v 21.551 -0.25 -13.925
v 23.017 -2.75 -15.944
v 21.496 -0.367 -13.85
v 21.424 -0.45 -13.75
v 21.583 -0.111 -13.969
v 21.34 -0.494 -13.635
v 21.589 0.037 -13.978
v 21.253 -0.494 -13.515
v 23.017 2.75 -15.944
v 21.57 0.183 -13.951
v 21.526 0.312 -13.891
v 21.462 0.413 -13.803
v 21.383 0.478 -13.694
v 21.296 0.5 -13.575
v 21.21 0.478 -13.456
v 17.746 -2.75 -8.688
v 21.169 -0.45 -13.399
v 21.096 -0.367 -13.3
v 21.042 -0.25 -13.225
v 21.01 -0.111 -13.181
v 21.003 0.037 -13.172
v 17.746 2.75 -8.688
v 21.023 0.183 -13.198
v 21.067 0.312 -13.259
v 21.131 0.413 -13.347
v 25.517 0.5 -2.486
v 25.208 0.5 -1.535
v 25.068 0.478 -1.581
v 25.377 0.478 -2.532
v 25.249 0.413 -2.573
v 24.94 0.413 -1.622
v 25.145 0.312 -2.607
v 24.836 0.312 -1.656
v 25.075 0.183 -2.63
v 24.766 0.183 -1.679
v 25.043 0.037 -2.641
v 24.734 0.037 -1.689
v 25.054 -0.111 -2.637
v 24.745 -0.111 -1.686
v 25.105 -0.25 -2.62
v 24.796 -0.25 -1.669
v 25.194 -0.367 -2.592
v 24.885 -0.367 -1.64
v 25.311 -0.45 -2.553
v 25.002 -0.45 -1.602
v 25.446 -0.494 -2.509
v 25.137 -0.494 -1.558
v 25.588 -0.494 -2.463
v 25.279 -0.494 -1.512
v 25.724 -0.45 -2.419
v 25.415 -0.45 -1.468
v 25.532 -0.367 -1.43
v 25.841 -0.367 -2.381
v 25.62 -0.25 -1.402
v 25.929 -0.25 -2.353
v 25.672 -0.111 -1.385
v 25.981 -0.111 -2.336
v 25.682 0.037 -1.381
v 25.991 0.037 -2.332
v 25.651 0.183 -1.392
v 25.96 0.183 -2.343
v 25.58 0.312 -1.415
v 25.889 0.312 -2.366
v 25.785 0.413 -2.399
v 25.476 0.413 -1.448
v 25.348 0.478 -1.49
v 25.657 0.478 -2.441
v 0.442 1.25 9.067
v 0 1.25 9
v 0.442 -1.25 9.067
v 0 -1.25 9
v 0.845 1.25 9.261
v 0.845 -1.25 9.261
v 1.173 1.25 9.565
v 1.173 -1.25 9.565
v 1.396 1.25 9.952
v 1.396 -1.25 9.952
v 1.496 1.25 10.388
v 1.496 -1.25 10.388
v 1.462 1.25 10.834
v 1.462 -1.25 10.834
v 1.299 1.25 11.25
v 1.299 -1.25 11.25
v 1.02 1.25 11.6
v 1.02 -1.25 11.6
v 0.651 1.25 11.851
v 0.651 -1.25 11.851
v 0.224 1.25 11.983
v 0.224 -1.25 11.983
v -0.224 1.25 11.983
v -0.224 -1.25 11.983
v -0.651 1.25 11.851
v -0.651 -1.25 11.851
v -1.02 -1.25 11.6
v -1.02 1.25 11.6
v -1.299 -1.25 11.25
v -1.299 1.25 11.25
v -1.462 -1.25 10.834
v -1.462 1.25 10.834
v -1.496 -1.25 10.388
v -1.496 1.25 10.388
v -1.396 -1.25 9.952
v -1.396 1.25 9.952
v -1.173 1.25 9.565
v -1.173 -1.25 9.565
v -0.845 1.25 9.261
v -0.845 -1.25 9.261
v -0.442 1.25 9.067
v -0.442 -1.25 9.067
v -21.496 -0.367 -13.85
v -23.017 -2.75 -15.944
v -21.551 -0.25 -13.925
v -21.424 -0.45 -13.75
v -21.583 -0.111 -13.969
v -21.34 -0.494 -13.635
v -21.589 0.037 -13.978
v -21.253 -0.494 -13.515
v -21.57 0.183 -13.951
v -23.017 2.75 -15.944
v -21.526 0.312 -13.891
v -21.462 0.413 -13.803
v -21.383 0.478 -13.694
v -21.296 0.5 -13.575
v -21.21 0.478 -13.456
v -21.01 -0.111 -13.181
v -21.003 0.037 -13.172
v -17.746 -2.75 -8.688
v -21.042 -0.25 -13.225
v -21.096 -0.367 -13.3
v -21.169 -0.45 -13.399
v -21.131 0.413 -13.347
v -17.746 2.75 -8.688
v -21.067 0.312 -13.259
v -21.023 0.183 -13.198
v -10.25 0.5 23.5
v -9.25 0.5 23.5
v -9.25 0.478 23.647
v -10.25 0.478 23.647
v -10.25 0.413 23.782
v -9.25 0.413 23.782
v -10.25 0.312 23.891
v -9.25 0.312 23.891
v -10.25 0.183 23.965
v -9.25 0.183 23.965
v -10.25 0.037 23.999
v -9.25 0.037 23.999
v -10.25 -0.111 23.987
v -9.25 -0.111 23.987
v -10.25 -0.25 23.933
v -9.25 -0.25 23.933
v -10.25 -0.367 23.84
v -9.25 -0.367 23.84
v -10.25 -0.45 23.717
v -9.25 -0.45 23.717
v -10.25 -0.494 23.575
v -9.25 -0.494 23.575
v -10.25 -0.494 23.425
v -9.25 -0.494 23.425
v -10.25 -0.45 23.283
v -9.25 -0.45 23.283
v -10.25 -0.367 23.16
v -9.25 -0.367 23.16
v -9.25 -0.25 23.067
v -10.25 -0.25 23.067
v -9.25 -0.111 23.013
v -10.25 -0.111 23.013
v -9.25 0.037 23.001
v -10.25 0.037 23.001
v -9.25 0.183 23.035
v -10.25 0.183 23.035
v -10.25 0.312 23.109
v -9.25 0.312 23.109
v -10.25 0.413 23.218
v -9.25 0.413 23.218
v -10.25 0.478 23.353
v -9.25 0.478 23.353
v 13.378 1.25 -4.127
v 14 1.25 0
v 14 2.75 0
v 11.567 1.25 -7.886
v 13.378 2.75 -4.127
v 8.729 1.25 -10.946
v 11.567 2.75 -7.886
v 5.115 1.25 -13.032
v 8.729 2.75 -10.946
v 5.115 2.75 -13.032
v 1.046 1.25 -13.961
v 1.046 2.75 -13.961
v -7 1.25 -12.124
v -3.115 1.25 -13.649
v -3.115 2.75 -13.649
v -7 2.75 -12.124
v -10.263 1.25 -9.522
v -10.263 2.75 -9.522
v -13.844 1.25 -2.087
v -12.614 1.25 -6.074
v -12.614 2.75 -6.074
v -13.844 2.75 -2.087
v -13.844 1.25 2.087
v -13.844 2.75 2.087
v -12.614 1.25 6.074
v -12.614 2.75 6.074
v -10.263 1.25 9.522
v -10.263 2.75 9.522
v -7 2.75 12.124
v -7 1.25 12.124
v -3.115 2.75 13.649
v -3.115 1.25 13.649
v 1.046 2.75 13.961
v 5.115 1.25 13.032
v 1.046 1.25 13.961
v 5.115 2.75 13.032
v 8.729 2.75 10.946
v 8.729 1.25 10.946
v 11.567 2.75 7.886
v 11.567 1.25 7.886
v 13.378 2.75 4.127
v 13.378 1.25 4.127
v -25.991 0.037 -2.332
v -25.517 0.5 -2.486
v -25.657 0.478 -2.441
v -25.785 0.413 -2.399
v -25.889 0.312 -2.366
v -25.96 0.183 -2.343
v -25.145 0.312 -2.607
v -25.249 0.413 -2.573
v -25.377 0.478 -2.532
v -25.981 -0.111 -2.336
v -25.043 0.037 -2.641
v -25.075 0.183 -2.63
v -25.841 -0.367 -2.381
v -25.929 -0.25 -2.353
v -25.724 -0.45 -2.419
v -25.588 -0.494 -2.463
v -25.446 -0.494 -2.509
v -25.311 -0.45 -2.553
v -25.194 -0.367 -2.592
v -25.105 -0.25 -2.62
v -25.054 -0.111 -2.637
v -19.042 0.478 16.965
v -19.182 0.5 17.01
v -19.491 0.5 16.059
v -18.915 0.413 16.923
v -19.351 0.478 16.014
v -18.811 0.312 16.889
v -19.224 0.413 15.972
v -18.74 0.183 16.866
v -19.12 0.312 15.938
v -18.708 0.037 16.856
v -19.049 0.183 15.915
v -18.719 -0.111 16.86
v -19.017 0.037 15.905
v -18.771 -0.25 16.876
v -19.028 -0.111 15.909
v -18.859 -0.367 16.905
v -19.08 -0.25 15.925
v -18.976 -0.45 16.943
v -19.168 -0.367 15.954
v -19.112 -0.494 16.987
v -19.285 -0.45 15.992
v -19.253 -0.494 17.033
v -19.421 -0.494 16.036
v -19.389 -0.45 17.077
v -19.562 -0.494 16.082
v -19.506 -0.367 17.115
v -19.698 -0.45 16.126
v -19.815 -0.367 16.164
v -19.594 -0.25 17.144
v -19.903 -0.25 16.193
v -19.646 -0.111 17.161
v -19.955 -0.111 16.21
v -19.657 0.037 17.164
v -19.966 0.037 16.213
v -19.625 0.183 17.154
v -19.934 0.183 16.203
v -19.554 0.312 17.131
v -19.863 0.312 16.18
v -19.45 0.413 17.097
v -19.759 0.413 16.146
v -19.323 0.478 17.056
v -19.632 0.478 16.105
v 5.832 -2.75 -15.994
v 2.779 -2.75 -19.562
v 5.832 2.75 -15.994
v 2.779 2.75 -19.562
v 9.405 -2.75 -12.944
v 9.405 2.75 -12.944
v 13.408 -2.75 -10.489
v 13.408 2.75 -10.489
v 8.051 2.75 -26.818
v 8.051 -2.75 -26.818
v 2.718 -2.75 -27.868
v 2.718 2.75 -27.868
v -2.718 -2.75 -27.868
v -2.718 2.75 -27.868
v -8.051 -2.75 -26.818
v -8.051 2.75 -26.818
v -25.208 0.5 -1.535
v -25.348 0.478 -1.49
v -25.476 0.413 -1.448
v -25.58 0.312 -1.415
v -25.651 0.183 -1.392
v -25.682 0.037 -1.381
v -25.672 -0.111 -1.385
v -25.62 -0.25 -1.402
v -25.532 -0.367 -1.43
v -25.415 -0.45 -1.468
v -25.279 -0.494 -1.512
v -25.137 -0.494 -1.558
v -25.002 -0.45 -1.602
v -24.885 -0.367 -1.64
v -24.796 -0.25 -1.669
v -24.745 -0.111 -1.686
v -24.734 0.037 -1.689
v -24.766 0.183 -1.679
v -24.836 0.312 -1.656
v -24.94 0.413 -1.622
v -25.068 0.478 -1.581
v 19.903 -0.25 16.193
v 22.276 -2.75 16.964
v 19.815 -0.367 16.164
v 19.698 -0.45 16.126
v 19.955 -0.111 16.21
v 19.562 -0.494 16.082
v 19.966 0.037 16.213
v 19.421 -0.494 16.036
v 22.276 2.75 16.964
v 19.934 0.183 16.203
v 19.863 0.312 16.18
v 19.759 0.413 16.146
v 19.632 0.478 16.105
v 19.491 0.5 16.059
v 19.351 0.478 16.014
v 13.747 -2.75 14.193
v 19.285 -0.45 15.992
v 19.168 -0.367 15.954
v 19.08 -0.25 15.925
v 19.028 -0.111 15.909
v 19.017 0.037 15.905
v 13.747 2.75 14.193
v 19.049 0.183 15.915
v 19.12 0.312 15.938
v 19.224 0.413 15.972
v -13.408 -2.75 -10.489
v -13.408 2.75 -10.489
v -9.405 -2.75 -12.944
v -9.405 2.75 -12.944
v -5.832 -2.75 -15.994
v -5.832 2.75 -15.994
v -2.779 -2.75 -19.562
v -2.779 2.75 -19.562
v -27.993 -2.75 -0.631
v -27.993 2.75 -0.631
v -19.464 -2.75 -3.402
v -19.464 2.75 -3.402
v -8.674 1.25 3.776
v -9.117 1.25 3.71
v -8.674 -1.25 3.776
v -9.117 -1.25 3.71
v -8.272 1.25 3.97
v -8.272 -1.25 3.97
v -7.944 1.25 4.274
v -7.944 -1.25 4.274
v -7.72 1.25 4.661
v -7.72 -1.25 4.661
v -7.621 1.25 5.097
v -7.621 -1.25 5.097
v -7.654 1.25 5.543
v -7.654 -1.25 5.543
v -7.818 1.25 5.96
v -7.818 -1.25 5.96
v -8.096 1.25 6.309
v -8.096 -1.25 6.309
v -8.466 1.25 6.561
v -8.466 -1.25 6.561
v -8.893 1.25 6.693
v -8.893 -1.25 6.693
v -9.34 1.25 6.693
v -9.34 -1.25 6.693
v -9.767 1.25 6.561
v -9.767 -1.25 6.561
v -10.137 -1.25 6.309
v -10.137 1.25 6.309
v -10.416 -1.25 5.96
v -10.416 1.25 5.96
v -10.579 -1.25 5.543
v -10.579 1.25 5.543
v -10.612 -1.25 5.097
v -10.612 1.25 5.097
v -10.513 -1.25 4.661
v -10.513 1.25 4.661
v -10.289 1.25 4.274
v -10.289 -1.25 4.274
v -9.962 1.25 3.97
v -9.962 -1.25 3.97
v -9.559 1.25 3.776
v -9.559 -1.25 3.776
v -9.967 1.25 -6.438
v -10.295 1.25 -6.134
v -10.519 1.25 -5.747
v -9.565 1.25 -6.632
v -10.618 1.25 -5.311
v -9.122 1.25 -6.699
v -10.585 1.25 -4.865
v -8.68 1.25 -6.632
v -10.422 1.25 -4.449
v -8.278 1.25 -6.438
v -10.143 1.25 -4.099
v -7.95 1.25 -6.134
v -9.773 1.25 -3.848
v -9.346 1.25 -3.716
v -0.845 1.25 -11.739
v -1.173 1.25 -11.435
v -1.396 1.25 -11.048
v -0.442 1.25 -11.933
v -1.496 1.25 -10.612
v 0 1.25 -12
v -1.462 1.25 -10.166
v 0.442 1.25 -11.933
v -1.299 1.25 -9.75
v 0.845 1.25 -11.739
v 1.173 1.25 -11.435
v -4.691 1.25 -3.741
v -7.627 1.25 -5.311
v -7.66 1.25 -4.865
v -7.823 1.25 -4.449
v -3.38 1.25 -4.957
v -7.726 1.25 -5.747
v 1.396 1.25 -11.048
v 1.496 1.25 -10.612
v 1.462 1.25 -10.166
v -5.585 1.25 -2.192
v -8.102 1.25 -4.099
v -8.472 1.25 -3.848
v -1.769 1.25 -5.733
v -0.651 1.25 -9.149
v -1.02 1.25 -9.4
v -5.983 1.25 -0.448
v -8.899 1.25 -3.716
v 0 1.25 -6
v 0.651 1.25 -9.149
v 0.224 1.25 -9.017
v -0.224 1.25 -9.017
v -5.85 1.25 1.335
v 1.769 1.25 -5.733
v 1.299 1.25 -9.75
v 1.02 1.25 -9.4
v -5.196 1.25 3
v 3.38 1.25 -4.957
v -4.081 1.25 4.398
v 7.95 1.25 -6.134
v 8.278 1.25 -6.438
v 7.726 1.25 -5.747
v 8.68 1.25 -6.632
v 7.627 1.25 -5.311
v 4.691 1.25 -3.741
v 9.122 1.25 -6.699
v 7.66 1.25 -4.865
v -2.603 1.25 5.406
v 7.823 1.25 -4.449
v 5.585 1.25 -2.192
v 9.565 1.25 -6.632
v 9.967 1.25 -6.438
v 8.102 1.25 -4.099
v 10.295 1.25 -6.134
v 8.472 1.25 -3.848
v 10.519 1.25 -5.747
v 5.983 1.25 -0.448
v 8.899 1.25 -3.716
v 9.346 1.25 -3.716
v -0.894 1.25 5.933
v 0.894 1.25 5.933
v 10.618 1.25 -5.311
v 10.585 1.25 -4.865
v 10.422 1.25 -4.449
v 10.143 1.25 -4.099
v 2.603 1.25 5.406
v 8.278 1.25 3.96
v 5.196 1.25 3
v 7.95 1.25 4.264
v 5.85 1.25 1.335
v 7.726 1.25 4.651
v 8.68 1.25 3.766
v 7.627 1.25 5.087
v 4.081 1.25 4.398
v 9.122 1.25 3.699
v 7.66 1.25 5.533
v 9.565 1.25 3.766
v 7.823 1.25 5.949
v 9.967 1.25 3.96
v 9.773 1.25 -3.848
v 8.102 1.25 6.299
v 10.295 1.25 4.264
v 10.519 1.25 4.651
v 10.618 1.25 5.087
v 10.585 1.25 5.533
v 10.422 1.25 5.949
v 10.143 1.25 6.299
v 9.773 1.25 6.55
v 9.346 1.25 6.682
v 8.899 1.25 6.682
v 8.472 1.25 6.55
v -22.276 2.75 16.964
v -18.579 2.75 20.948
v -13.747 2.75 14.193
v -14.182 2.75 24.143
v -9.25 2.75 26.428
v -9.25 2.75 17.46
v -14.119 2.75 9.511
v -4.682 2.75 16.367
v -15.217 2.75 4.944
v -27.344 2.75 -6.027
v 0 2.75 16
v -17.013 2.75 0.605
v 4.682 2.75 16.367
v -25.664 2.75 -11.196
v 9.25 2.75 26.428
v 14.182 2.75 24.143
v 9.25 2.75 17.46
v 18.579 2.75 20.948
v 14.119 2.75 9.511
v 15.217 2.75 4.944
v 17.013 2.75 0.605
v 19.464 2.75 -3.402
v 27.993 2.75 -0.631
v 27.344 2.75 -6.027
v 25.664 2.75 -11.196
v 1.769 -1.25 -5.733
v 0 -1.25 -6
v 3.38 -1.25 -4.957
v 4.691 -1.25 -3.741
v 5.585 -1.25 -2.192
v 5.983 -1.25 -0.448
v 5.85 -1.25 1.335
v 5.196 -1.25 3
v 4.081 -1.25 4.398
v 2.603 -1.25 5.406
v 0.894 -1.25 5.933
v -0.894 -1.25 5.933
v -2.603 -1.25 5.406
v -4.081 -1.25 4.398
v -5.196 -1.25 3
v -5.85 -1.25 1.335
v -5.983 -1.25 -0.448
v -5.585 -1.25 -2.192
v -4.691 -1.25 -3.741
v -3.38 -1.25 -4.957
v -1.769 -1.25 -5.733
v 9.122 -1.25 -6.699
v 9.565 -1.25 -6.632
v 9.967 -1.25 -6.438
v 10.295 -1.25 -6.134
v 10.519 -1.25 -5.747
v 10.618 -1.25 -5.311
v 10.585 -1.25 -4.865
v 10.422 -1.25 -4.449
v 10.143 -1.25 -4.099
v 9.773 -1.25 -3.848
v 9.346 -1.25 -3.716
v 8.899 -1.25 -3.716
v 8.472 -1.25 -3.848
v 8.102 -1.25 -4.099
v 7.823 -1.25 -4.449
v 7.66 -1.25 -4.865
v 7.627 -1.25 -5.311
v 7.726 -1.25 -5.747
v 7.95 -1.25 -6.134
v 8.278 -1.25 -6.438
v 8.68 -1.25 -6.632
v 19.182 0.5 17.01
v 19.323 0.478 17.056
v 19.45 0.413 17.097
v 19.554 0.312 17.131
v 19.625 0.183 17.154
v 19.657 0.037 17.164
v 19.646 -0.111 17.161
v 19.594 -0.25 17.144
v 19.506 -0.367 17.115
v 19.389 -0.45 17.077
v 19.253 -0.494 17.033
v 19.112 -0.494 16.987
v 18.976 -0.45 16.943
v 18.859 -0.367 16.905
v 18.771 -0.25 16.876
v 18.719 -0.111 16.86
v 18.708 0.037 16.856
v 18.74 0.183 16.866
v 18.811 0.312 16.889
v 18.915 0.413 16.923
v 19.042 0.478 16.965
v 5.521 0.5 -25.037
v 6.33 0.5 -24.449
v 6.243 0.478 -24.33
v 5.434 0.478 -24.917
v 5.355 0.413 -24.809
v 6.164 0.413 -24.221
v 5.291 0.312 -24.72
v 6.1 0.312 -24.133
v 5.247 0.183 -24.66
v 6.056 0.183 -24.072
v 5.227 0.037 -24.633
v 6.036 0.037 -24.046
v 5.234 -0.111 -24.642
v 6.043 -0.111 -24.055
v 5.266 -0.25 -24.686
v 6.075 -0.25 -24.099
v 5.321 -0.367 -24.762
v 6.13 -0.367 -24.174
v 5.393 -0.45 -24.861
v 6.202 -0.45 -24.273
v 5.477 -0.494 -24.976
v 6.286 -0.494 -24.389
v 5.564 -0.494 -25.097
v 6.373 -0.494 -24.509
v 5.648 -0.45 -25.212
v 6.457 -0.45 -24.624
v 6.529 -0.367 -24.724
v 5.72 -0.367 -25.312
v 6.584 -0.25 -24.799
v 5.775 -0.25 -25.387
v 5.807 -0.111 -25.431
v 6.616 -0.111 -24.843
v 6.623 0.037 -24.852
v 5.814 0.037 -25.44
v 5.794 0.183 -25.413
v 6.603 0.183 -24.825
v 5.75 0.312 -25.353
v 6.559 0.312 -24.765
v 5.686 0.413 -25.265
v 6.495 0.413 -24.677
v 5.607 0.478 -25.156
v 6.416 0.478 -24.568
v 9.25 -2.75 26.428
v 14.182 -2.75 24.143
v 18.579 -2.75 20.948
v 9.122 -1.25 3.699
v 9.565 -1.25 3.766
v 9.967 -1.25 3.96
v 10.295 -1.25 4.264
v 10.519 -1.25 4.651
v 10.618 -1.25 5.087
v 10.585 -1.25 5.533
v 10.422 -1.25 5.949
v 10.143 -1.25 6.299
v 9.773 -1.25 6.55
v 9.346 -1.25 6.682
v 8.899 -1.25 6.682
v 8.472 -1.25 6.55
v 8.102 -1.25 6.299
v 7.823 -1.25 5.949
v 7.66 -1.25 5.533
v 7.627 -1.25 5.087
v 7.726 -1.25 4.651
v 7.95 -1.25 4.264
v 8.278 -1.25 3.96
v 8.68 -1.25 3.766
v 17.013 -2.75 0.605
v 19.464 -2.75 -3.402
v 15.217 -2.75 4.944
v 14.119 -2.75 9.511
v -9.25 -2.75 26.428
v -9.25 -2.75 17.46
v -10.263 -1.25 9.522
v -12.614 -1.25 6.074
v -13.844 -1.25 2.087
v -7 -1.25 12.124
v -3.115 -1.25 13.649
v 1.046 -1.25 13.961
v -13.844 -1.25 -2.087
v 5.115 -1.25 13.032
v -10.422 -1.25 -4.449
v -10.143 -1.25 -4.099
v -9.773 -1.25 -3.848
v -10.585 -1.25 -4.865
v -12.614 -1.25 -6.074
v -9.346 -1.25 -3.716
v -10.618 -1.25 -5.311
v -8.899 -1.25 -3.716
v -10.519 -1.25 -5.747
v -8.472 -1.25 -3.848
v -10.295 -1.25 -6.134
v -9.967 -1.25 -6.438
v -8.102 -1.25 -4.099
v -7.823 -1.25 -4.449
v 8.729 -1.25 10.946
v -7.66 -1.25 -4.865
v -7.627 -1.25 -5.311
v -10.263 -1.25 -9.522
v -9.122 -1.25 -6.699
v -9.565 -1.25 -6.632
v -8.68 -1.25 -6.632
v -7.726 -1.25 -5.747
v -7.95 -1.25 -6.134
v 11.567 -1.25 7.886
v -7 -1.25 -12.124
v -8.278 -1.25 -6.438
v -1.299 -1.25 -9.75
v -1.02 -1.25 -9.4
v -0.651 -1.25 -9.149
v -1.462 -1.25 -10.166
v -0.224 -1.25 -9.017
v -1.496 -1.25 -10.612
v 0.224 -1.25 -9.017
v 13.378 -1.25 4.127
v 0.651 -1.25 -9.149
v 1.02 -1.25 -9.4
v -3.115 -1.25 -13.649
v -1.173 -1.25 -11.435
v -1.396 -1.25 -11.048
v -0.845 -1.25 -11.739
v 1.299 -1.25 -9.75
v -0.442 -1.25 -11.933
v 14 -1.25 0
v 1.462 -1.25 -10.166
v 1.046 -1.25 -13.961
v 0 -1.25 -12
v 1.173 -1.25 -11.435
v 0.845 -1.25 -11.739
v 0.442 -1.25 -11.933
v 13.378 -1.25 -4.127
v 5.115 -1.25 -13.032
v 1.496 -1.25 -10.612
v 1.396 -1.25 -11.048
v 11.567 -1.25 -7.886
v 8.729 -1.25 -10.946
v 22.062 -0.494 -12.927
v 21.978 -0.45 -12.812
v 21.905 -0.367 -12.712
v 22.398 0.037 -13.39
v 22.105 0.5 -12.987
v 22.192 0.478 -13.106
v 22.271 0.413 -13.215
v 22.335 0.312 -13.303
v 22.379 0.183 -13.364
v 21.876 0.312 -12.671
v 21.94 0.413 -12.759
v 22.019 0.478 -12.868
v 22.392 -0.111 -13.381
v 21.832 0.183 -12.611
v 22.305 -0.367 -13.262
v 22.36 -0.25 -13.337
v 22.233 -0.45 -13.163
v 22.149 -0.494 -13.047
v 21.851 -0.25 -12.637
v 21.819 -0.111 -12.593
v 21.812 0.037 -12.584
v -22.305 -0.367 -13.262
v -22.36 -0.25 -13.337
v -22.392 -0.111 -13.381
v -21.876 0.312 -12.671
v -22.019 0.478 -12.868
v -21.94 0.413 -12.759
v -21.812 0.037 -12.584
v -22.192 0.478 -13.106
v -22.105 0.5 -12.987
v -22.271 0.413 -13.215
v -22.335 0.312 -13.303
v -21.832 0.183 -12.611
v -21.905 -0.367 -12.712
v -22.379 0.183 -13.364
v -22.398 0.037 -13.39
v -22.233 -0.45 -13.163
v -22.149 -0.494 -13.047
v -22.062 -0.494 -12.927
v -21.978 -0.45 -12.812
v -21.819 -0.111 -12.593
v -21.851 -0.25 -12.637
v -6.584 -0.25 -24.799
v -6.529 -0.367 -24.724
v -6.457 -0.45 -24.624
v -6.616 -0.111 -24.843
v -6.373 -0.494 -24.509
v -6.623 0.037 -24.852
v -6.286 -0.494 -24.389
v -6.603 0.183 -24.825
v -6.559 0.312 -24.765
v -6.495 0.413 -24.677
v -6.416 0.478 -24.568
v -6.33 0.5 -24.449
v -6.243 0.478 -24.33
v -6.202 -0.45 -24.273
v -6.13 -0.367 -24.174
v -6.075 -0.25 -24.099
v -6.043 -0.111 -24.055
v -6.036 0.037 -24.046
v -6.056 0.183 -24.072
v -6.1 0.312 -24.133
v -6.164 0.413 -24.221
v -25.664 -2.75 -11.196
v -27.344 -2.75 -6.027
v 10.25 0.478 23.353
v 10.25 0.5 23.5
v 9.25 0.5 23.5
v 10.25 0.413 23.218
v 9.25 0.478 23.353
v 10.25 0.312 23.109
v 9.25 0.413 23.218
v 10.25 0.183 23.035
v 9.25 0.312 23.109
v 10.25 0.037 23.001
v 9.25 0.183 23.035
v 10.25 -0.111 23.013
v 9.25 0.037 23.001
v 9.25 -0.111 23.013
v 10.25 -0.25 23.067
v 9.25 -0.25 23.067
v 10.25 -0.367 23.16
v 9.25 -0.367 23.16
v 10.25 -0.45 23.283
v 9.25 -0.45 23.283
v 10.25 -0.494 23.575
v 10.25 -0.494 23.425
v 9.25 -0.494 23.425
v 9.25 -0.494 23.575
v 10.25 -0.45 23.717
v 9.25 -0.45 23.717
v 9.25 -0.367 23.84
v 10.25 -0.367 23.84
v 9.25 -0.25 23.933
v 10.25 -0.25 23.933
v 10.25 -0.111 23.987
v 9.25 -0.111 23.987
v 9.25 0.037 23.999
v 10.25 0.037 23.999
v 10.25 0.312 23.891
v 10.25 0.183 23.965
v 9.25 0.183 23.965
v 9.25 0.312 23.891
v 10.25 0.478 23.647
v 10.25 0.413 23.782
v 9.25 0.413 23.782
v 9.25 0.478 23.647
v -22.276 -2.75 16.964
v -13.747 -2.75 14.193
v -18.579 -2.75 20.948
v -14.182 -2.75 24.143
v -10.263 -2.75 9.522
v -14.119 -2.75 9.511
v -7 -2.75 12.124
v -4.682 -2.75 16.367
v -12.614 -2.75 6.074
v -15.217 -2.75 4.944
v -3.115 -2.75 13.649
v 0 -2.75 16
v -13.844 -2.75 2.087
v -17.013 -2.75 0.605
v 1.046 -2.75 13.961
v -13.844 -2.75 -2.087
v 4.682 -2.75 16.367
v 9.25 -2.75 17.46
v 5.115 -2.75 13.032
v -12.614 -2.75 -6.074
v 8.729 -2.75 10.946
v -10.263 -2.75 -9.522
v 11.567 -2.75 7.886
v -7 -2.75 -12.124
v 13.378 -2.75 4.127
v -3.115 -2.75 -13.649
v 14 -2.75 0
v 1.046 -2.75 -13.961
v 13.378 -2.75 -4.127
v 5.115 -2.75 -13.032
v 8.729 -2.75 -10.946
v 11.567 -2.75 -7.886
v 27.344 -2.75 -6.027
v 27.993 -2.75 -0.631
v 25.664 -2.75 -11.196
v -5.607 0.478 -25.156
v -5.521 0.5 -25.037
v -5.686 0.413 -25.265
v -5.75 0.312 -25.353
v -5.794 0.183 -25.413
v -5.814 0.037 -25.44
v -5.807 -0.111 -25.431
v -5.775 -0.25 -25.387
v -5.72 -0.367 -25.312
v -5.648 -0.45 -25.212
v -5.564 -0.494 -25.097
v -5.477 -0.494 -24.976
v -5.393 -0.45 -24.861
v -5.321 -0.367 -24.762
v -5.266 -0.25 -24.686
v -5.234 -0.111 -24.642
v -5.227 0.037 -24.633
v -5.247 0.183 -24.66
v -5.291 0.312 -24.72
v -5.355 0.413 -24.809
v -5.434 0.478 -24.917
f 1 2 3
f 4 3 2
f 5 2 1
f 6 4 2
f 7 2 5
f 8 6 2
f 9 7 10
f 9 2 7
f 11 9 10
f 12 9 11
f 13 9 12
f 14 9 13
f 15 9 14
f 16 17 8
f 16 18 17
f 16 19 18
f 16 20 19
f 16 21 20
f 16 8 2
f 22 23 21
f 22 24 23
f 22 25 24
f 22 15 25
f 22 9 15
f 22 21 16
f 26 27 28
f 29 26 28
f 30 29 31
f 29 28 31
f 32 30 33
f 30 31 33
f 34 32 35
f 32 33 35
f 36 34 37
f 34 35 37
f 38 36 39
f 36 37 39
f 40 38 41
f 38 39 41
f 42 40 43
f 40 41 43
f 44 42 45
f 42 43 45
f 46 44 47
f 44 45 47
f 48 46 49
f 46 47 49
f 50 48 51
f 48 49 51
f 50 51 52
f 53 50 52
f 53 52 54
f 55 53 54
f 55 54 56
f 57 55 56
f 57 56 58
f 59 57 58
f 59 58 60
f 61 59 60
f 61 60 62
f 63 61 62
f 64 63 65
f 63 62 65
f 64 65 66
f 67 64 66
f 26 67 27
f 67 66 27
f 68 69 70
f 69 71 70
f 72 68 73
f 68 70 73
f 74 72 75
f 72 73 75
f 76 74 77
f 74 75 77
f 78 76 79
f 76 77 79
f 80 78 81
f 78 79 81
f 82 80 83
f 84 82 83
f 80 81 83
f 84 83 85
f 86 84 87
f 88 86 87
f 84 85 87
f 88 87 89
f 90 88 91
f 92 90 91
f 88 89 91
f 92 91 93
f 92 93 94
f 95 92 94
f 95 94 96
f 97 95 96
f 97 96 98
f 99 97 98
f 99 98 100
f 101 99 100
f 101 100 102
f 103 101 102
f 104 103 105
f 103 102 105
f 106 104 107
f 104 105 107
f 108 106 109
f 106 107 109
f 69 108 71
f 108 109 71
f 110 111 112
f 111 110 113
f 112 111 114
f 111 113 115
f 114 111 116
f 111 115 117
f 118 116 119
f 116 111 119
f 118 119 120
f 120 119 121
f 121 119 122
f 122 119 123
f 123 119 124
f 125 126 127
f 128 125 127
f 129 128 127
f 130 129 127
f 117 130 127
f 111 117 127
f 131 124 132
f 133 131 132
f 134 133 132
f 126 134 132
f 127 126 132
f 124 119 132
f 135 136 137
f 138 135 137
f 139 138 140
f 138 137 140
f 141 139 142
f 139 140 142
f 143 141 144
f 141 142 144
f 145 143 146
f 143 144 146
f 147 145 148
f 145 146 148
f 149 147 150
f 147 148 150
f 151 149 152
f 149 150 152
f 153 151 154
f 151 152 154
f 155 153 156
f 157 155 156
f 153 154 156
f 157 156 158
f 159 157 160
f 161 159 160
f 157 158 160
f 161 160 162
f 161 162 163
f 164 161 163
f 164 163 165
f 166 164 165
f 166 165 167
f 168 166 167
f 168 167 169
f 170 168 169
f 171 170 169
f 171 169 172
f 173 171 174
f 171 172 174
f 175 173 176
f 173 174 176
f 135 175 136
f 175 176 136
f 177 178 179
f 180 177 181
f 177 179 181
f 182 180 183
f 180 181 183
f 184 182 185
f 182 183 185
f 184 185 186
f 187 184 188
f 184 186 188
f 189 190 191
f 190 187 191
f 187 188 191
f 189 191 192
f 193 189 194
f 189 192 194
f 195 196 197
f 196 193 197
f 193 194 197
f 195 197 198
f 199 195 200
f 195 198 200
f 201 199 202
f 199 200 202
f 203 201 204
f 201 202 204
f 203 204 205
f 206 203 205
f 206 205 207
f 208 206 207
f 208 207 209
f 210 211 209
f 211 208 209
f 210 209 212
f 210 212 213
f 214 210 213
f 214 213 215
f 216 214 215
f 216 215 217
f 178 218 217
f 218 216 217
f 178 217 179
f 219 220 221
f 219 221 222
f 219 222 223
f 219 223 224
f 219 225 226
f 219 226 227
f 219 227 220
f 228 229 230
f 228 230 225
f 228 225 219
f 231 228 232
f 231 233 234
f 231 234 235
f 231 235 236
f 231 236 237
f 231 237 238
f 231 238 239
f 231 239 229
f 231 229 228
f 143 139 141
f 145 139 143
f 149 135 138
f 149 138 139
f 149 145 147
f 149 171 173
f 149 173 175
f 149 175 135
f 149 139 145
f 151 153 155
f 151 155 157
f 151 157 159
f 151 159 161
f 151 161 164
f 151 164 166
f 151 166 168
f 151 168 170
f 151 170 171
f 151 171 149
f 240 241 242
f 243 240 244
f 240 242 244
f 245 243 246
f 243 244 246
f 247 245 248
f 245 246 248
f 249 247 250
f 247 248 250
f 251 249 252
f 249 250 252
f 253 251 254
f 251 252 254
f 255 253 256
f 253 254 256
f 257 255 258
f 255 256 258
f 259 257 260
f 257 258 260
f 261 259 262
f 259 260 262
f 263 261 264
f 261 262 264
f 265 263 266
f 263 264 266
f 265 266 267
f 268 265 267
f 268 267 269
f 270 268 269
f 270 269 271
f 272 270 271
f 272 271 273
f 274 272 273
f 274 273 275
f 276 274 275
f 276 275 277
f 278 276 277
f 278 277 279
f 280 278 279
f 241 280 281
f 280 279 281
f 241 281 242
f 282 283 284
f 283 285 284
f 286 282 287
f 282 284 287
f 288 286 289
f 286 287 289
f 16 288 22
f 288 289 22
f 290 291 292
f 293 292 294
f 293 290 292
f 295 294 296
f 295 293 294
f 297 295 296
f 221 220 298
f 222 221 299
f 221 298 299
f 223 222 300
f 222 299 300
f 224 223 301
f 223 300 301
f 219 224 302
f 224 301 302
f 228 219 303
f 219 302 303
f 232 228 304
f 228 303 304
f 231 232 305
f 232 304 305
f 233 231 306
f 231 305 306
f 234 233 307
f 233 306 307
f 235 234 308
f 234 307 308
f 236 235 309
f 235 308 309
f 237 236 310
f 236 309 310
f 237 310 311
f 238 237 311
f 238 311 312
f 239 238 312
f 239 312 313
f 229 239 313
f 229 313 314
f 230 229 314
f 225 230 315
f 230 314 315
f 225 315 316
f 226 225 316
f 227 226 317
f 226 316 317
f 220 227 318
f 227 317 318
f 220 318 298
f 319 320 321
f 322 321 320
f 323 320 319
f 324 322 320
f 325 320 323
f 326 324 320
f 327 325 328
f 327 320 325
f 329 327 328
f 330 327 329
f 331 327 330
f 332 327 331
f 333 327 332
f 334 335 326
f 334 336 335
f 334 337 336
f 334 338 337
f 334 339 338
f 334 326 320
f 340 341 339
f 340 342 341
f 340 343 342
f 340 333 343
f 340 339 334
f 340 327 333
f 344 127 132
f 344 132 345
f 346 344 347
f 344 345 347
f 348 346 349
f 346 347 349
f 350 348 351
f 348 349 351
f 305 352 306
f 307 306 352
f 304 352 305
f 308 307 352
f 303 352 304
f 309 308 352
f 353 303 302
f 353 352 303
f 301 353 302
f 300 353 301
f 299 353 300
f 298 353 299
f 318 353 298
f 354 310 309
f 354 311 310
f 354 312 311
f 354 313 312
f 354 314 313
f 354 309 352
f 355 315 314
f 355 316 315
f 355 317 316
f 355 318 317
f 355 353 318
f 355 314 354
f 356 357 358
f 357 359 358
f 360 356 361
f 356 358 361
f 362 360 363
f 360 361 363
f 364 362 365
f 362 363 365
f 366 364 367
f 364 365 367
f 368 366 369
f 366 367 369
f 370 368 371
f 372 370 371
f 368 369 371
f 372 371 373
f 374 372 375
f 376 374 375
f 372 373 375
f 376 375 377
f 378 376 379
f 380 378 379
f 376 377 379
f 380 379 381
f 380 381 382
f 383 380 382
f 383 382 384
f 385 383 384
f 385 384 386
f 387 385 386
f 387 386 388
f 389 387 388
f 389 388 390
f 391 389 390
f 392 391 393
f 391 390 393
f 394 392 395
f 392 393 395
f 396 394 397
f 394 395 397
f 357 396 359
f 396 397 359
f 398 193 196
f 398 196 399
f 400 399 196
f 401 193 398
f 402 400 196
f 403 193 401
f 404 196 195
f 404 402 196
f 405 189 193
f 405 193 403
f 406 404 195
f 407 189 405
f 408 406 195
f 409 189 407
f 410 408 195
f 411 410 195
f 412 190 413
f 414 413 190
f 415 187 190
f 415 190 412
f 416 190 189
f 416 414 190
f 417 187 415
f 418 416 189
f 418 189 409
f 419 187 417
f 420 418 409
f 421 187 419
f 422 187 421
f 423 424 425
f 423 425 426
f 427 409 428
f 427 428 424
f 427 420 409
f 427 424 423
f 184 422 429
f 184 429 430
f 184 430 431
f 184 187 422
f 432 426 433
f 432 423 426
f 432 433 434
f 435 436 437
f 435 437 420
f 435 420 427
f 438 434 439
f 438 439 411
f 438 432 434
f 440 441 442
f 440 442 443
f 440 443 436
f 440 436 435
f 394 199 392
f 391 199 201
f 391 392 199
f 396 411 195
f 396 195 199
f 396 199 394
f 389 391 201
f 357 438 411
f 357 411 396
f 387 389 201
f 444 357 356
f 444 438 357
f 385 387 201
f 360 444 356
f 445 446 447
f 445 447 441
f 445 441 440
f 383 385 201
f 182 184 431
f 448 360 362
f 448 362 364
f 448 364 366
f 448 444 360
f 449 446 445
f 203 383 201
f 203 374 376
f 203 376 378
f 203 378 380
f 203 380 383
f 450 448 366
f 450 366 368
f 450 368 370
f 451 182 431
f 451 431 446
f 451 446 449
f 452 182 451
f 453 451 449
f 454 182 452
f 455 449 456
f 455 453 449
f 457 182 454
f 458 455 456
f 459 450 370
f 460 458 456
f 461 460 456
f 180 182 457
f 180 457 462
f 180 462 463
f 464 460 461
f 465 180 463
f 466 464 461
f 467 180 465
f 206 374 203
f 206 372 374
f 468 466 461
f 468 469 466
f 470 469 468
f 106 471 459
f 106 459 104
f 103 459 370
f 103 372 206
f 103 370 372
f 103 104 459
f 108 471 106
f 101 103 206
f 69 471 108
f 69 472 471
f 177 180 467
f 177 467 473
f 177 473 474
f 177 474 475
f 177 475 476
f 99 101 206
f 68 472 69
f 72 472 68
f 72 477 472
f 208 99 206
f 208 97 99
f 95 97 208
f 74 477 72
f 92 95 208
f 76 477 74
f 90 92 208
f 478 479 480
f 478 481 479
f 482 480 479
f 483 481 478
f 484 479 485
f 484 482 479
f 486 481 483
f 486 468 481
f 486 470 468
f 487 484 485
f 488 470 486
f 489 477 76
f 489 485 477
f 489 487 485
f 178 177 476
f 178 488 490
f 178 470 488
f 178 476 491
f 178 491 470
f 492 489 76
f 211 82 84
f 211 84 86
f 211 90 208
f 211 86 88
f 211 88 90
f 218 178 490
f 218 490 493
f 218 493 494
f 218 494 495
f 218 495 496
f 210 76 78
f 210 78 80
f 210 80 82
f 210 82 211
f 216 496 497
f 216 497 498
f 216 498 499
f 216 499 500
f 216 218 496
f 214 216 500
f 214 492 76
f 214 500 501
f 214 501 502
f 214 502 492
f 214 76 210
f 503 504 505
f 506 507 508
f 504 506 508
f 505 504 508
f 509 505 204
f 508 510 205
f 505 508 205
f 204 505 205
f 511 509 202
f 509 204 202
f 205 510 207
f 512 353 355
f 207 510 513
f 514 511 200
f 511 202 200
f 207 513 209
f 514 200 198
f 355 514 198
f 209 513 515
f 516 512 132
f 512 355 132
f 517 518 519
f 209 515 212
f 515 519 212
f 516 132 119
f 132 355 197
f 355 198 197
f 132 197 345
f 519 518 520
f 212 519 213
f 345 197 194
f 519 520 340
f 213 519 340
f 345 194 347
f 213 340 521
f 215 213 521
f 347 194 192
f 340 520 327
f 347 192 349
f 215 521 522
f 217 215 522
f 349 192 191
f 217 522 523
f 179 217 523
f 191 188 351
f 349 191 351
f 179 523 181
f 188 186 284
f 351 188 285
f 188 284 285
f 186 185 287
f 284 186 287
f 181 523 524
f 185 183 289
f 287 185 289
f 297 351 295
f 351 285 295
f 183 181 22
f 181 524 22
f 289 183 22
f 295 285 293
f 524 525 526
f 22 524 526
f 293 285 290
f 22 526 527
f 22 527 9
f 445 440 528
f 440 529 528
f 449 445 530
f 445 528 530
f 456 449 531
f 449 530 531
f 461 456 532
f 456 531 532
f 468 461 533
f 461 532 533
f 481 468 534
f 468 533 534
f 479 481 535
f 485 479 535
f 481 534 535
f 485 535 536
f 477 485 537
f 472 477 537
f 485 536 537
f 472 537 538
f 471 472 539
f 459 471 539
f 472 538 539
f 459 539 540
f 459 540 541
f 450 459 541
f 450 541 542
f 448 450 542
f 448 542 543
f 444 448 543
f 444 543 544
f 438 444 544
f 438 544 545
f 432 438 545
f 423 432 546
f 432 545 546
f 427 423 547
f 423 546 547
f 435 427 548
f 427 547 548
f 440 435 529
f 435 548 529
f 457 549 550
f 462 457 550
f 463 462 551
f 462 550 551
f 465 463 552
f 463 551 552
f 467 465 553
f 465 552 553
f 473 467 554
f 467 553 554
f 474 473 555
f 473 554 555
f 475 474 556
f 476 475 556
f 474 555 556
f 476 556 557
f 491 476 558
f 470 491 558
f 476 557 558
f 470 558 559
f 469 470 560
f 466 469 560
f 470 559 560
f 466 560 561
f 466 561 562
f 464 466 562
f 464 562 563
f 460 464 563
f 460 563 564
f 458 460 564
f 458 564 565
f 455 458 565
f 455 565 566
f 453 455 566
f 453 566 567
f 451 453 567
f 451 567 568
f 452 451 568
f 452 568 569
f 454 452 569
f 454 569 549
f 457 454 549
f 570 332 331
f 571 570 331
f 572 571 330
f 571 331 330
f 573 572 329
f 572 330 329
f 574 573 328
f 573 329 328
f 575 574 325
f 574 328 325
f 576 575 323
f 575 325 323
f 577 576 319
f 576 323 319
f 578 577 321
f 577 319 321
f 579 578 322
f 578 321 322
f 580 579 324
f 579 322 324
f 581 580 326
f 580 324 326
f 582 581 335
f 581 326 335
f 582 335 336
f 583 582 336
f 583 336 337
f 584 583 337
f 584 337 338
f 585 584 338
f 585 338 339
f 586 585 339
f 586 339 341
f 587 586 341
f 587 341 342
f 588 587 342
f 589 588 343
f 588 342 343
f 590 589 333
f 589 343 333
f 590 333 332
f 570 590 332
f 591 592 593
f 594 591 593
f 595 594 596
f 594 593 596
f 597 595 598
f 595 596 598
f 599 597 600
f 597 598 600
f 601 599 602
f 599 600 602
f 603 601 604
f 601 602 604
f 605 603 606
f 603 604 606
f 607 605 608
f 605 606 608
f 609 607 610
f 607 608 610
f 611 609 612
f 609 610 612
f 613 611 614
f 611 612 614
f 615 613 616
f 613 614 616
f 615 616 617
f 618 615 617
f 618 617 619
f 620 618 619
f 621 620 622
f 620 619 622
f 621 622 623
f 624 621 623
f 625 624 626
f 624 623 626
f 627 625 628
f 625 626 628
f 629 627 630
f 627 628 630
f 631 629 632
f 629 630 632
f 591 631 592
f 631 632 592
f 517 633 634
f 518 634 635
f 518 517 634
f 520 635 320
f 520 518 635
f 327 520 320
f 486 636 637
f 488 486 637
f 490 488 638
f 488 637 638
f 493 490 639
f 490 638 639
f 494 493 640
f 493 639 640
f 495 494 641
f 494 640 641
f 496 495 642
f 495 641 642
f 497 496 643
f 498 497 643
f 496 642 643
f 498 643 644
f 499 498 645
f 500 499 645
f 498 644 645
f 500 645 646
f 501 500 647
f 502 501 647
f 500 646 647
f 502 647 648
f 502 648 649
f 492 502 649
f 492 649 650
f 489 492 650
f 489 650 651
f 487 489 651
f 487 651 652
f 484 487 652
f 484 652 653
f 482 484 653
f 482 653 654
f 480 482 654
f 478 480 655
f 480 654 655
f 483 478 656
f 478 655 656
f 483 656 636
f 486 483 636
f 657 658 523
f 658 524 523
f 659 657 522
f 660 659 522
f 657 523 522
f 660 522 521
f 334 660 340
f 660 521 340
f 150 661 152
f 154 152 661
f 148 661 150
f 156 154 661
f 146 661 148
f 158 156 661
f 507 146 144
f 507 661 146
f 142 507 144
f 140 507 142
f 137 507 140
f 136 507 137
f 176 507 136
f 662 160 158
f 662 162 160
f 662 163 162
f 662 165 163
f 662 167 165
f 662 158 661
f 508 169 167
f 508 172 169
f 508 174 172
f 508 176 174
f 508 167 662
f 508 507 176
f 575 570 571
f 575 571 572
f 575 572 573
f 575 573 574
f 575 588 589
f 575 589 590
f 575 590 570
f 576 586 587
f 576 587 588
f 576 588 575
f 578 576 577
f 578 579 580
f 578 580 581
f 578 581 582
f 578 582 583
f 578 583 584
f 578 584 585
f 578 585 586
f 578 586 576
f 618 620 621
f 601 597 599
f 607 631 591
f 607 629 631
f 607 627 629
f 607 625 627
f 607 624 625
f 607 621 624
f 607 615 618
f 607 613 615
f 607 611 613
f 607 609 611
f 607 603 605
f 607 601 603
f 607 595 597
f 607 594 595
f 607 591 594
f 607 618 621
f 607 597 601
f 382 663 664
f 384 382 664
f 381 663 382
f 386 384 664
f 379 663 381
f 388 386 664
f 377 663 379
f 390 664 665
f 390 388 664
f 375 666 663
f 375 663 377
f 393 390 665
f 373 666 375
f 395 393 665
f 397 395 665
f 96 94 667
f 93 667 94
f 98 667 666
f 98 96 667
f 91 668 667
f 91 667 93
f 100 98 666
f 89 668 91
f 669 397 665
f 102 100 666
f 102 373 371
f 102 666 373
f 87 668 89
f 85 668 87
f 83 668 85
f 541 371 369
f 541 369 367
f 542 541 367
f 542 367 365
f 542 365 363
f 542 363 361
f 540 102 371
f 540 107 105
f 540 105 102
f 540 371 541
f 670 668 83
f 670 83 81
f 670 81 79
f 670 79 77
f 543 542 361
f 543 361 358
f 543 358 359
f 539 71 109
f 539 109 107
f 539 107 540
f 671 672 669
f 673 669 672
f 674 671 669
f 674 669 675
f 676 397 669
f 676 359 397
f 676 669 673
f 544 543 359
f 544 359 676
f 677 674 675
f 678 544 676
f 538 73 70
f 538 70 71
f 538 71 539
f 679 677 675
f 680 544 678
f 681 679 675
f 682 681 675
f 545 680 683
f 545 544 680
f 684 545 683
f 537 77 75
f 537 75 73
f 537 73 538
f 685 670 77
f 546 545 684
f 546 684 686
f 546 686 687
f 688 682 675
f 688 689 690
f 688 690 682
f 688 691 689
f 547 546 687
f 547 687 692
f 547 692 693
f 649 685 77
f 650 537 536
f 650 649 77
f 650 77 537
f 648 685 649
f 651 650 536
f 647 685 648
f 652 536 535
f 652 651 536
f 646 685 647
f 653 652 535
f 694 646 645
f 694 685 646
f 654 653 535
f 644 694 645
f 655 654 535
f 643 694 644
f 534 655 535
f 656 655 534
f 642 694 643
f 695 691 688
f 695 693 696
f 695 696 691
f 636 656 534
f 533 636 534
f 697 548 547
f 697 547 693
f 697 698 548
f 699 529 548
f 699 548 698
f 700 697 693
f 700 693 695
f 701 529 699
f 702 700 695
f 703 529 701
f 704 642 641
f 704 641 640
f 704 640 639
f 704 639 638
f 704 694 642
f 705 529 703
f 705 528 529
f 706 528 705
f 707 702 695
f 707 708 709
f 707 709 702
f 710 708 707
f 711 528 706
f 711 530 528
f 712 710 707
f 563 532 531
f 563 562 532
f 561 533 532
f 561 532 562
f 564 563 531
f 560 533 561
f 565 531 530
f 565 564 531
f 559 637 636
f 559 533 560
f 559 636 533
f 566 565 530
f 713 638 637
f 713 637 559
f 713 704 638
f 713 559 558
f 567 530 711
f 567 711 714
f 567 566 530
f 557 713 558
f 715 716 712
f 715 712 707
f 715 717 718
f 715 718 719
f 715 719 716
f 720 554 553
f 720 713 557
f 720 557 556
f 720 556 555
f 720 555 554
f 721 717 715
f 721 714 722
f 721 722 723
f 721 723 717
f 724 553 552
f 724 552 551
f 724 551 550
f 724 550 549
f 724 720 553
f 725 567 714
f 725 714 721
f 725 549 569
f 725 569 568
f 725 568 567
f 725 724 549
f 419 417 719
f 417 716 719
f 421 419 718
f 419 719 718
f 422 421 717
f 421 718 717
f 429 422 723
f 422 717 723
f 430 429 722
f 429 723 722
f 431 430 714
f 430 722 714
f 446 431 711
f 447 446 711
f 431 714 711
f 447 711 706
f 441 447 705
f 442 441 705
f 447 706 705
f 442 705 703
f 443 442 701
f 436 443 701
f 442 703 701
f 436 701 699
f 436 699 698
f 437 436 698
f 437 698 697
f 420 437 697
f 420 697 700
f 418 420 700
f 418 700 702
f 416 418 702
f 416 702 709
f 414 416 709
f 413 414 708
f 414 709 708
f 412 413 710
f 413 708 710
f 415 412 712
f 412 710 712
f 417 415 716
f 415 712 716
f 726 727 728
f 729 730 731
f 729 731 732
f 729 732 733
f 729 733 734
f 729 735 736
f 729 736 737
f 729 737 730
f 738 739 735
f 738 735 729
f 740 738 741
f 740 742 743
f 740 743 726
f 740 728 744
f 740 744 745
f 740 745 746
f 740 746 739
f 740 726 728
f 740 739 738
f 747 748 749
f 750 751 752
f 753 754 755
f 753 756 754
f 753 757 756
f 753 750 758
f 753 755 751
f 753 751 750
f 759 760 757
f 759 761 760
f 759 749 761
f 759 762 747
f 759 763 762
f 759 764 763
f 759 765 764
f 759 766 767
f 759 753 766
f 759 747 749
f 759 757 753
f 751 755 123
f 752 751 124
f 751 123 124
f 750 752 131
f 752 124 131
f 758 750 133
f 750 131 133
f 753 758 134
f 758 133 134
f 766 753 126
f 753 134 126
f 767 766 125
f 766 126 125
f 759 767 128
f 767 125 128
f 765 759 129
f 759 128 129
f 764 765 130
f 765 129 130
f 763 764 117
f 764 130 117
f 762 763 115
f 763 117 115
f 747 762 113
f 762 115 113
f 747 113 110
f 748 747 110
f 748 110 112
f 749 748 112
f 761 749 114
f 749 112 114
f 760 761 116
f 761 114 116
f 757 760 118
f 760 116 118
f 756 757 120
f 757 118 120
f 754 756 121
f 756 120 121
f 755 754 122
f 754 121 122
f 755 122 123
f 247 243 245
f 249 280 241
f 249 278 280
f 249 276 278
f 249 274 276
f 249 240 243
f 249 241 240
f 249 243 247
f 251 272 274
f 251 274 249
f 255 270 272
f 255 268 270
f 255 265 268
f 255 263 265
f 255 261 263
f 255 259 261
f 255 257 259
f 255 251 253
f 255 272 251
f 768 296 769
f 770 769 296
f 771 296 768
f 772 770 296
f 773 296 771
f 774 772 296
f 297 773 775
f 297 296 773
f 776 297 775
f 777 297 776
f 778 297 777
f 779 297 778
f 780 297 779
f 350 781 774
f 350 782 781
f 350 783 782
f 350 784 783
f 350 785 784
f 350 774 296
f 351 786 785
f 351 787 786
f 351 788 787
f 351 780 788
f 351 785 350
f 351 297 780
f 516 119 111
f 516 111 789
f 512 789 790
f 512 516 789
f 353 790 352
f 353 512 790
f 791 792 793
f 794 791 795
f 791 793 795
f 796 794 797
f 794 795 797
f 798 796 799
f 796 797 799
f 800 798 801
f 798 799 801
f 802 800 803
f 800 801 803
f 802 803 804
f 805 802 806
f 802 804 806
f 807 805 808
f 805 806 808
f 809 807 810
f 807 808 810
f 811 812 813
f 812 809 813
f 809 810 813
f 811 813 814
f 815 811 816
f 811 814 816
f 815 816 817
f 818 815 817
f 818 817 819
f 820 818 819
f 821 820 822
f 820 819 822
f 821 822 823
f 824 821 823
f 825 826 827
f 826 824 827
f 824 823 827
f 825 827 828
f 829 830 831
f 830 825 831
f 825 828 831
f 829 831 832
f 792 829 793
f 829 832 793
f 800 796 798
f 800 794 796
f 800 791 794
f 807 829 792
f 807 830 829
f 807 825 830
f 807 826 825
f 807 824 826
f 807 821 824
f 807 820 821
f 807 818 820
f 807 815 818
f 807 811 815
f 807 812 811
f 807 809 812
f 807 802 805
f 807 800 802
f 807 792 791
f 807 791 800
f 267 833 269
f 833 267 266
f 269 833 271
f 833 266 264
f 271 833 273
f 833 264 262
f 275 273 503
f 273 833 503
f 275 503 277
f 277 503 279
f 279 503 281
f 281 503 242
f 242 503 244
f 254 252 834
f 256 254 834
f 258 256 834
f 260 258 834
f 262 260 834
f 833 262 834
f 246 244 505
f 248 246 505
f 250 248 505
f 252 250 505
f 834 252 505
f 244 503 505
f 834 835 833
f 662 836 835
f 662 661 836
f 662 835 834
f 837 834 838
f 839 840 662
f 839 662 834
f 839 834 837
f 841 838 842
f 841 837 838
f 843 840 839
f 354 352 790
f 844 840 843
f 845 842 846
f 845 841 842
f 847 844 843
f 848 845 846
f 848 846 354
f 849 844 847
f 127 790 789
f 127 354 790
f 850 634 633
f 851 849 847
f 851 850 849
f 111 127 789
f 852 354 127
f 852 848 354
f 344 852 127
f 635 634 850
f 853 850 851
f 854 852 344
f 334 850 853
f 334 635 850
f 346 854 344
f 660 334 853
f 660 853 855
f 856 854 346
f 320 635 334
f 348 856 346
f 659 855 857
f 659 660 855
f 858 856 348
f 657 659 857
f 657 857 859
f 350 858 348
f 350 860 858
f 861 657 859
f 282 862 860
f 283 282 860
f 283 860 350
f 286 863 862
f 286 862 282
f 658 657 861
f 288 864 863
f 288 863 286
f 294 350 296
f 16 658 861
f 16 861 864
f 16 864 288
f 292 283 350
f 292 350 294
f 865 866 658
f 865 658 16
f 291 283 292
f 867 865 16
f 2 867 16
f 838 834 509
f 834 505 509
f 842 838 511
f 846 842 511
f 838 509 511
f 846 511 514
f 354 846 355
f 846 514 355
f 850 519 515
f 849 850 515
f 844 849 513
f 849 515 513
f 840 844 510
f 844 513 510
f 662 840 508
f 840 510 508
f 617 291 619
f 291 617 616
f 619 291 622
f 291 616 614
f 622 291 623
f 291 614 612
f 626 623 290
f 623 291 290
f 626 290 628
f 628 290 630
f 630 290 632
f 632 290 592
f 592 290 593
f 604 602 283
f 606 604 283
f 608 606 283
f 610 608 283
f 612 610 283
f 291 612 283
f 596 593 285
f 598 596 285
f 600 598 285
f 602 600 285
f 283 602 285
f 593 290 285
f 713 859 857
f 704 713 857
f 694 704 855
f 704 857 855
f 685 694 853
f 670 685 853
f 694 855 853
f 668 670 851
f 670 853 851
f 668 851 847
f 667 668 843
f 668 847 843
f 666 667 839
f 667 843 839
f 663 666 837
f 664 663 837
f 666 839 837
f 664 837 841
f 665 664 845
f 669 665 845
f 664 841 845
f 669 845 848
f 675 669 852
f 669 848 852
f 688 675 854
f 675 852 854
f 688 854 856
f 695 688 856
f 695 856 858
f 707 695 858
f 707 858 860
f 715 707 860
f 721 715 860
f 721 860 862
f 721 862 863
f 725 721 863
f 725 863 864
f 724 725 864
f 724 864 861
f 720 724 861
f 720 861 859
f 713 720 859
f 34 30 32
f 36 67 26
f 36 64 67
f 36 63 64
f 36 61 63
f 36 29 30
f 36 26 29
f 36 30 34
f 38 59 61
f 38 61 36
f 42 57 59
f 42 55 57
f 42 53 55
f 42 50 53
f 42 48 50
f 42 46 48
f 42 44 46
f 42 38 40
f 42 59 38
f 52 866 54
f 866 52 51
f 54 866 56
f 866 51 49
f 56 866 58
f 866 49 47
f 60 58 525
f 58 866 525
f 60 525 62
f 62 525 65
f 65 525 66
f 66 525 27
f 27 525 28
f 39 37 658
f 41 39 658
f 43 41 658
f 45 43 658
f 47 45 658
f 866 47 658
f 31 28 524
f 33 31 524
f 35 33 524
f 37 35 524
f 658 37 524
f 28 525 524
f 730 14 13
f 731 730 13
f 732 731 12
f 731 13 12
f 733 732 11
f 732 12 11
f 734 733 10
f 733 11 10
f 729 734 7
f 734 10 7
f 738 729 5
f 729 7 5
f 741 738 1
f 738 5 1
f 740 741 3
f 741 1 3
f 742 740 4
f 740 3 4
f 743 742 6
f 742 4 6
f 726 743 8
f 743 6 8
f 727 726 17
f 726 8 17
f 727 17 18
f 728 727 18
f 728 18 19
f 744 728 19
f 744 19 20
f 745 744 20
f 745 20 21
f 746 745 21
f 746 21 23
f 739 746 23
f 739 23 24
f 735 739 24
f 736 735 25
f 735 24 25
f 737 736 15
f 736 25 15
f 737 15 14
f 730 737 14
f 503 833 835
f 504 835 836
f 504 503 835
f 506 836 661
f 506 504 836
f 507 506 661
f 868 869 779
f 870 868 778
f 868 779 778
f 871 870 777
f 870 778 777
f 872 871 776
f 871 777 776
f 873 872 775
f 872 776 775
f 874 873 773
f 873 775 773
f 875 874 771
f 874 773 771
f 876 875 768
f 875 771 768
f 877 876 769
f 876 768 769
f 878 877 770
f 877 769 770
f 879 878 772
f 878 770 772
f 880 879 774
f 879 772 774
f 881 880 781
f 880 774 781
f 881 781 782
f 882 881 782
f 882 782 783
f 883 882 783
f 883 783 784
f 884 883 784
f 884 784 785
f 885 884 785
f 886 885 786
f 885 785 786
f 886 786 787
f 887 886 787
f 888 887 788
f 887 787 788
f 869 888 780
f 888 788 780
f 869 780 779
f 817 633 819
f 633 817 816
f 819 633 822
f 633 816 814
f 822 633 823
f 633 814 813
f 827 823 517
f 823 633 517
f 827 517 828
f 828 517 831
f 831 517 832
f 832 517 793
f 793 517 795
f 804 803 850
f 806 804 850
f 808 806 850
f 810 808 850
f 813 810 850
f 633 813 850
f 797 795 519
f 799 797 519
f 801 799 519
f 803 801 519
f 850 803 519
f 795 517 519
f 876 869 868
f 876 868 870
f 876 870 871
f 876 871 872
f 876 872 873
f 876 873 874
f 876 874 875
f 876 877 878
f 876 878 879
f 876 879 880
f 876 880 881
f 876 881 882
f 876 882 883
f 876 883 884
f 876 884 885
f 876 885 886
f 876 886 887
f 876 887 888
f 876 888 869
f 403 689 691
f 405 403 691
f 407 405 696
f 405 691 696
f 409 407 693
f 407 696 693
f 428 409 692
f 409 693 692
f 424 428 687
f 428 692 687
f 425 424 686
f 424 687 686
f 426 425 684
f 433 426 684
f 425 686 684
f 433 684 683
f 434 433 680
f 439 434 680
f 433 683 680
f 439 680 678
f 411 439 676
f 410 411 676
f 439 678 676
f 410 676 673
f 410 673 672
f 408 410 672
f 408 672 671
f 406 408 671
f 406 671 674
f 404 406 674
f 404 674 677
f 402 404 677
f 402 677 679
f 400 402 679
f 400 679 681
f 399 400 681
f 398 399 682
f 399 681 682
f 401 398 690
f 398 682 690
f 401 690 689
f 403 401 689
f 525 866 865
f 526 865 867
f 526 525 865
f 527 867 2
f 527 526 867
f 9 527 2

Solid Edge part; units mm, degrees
sketch "Sketch1" plane through (0, 0, 0) normal (0, -1, 0) x (1, 0, 0)
  circle A0 centre (0, 0) radius 28
extrude "Protrusion1" add sketch "Sketch1" along normal mid plane 5.5
sketch "Sketch2" plane through (0, -2.75, 0) normal (0, -1, 0) x (1, 0, 0)
  circle A0 centre (0, 0) radius 14
extrude "Extrusionsausschnitt_1" cut sketch "Sketch2" against normal blind 1.5 and the other way blind 1.5
mirror "Mirror1" about plane through (0, 0, 0) normal (0, -1, 0) of "Extrusionsausschnitt_1"
hole "Bohrung_1" at (-9.1166, -1.25, 5.2095) direction (0, 1, 0) diameter 3 end up to next
hole "Hole1" at (0, -1.25, 10.5) direction (0, 1, 0) diameter 3 end up to next
hole "Hole2" at (9.1225, -1.25, 5.199) direction (0, 1, 0) diameter 3 end up to next
hole "Hole3" at (9.1225, -1.25, -5.199) direction (0, 1, 0) diameter 3 end up to next
hole "Hole4" at (0, -1.25, -10.5) direction (0, 1, 0) diameter 3 end up to next
hole "Hole5" at (-9.1225, -1.25, -5.199) direction (0, 1, 0) diameter 3 end up to next
sketch "Sketch3" plane through (0, -2.75, 0) normal (0, -1, 0) x (1, 0, 0)
  line L0 (-9.25, 23.5) -> (-9.25, 17.46)
  arc A0 (-9.25, 17.46) -> (9.25, 17.46) centre (0, 46.0322) ccw
  line L1 (9.25, 23.5) -> (9.25, 17.46)
  line L2 (9.25, 23.5) -> (9.25, 28.54)
  arc A1 (-9.25, 28.54) -> (9.25, 28.54) centre (0, -0.0322) cw
  line L3 (-9.25, 23.5) -> (-9.25, 28.54)
extrude "Extrusionsausschnitt_3" cut sketch "Sketch3" along normal mid plane 52.8693
pattern_circular "Muster_1" count 5 over 360 about axis through (0, -2.75, 0) along (0, 1, 0) of "Extrusionsausschnitt_3"
sketch "Sketch4" plane through (-9.25, 0, 21.944) normal (1, 0, 0) x (0, 1, 0)
  circle A0 centre (0, 1.556) radius 0.5
extrude "Extrusionsausschnitt_8" cut sketch "Sketch4" against normal blind 1 and the other way blind 1
mirror "Mirror2" about plane through (0, 0, 0) normal (1, 0, 0) of "Extrusionsausschnitt_8"
pattern_circular "Pattern1" count 5 over 360 about axis through (0, -2.75, 0) along (0, 1, 0) of "Extrusionsausschnitt_8", "Mirror2"
hole "Bohrung_7" at (0, -1.25, 0) direction (0, 1, 0) diameter 12 end up to next
properties material "Wheel2"
